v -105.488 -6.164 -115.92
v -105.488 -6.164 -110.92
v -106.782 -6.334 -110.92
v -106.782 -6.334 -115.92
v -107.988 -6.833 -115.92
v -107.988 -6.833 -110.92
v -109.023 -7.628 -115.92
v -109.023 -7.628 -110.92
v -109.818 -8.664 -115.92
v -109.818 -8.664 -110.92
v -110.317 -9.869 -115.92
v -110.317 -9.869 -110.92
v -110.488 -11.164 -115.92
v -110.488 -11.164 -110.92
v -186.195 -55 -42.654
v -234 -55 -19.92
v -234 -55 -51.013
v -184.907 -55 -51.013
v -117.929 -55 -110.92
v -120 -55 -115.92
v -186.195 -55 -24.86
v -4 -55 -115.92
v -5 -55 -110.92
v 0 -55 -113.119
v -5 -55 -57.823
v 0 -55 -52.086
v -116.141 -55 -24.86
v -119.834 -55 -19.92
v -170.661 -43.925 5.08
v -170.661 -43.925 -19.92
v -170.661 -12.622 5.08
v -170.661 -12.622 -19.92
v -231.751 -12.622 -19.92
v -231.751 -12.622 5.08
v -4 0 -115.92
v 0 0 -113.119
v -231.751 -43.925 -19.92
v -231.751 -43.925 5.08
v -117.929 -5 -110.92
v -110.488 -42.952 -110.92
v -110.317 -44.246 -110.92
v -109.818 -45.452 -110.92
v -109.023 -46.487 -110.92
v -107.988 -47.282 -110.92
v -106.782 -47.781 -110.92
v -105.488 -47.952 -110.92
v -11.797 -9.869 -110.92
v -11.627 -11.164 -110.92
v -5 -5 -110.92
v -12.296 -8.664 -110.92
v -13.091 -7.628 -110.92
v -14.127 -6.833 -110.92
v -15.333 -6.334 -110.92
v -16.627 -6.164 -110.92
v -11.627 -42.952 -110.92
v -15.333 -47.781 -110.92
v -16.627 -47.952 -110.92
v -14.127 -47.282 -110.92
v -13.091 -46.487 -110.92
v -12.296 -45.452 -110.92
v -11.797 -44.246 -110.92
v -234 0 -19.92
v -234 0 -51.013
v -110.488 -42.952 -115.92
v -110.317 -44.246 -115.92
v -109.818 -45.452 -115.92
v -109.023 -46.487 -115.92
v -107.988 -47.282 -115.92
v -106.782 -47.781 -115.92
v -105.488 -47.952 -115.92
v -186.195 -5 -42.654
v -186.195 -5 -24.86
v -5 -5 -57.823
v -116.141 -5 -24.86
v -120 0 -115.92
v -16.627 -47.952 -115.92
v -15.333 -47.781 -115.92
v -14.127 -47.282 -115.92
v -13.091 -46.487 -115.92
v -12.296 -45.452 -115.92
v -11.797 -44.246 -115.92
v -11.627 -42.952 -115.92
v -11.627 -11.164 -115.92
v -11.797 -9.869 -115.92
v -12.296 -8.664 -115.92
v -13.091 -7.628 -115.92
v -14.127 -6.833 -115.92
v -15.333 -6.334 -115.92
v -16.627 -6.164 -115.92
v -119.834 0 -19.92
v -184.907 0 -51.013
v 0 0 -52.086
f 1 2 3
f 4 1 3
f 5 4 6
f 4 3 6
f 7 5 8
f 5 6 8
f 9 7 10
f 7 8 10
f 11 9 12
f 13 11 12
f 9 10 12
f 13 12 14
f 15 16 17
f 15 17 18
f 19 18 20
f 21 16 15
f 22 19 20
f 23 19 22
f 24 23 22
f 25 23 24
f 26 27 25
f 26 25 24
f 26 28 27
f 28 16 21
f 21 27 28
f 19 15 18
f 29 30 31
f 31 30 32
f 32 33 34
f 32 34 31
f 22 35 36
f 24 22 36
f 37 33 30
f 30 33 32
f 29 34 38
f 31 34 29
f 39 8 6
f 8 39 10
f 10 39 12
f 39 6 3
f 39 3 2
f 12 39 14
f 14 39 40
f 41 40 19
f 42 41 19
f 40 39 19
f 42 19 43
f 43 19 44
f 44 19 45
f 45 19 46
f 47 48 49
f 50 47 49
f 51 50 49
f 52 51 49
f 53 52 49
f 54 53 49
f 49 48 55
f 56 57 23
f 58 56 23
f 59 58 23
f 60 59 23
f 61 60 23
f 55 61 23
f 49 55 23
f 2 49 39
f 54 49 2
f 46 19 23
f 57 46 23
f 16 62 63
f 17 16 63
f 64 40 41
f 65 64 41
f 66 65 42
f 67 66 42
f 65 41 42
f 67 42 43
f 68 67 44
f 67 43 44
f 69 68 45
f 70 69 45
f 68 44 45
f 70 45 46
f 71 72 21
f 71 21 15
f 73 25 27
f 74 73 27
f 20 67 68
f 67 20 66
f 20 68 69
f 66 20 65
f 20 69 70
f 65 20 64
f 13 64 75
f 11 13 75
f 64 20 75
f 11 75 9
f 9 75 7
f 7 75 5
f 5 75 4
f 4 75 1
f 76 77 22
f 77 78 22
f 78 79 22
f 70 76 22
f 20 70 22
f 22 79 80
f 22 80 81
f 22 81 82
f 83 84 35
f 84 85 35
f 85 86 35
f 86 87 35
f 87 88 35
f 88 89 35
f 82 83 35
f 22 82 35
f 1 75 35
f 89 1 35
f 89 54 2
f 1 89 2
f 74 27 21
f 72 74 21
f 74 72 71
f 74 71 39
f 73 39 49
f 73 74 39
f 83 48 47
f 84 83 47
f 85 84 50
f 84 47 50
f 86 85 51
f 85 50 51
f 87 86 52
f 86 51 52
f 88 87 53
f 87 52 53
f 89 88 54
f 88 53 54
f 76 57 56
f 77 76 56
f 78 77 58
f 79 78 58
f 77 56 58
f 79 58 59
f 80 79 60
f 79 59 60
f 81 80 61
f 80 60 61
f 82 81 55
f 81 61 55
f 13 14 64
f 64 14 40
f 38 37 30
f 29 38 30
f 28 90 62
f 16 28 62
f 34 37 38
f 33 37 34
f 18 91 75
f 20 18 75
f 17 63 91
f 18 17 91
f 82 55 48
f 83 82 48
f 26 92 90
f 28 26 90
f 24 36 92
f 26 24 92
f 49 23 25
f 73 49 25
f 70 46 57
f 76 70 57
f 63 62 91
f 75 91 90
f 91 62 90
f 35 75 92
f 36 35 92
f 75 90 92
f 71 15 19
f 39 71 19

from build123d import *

# Parameters (mm, degrees)
F1_DEPTH      = 55
F3_DEPTH      = 50
F3_DEPTH_BACK = 50
F5_DEPTH      = 25
F7_W          = 61.0898286104
F7_H          = 31.3037931919
F8_DEPTH      = 25


with BuildPart() as f1:
    # F0 (on Front) → F1 (new body)
    with BuildSketch(Plane.XZ):
        Polygon((0, -113.1189545868), (0, -52.0862899721), (-119.8339686111, -19.9197847396), (-234, -19.9197847396), (-234, -51.0128117148), (-184.9069730248, -51.0128117148), (-120, -115.9197847396), (-4, -115.9197847396), align=None)
    extrude(amount=F1_DEPTH)

    # F2 (on face) → F3 (cut, two sides)
    with BuildSketch(Plane.XZ.offset(55)) as f3_sk:
        Polygon((-116.1406338215, -24.8601548374), (-186.1951341673, -24.8601548374), (-186.1951341673, -42.6535827604), (-117.9289321881, -110.9197847396), (-5, -110.9197847396), (-5, -57.8232035041), align=None)
    extrude(amount=-F3_DEPTH, mode=Mode.SUBTRACT)
    extrude(f3_sk.sketch, amount=F3_DEPTH_BACK, mode=Mode.SUBTRACT)

    # F4 (on face) → F5 (cut)
    with BuildSketch(Plane.XY.offset(-110.9197847396)):
        with BuildLine():
            Line((-16.626615189, -6.1635137536), (-105.4877889156, -6.1635137536))
            ThreePointArc((-105.4877889156, -6.1635137536), (-109.0233228216, -7.6279798476), (-110.4877889156, -11.1635137536))
            Line((-110.4877889156, -11.1635137536), (-110.4877889156, -42.9515232146))
            ThreePointArc((-110.4877889156, -42.9515232146), (-109.0233228216, -46.4870571205), (-105.4877889156, -47.9515232146))
            Line((-105.4877889156, -47.9515232146), (-16.626615189, -47.9515232146))
            ThreePointArc((-16.626615189, -47.9515232146), (-13.0910812831, -46.4870571205), (-11.626615189, -42.9515232146))
            Line((-11.626615189, -42.9515232146), (-11.626615189, -11.1635137536))
            ThreePointArc((-11.626615189, -11.1635137536), (-13.0910812831, -7.6279798476), (-16.626615189, -6.1635137536))
        make_face()
    extrude(amount=-F5_DEPTH, mode=Mode.SUBTRACT)


with BuildPart() as f8:
    # F7 (on offset) → F8 (new body)
    with BuildSketch(Plane.XY.offset(-19.9197847396)):
        with Locations((-201.2057080865, -28.2735787332)):
            Rectangle(F7_W, F7_H)
    extrude(amount=F8_DEPTH)


solid = Compound([f1.part, f8.part])
